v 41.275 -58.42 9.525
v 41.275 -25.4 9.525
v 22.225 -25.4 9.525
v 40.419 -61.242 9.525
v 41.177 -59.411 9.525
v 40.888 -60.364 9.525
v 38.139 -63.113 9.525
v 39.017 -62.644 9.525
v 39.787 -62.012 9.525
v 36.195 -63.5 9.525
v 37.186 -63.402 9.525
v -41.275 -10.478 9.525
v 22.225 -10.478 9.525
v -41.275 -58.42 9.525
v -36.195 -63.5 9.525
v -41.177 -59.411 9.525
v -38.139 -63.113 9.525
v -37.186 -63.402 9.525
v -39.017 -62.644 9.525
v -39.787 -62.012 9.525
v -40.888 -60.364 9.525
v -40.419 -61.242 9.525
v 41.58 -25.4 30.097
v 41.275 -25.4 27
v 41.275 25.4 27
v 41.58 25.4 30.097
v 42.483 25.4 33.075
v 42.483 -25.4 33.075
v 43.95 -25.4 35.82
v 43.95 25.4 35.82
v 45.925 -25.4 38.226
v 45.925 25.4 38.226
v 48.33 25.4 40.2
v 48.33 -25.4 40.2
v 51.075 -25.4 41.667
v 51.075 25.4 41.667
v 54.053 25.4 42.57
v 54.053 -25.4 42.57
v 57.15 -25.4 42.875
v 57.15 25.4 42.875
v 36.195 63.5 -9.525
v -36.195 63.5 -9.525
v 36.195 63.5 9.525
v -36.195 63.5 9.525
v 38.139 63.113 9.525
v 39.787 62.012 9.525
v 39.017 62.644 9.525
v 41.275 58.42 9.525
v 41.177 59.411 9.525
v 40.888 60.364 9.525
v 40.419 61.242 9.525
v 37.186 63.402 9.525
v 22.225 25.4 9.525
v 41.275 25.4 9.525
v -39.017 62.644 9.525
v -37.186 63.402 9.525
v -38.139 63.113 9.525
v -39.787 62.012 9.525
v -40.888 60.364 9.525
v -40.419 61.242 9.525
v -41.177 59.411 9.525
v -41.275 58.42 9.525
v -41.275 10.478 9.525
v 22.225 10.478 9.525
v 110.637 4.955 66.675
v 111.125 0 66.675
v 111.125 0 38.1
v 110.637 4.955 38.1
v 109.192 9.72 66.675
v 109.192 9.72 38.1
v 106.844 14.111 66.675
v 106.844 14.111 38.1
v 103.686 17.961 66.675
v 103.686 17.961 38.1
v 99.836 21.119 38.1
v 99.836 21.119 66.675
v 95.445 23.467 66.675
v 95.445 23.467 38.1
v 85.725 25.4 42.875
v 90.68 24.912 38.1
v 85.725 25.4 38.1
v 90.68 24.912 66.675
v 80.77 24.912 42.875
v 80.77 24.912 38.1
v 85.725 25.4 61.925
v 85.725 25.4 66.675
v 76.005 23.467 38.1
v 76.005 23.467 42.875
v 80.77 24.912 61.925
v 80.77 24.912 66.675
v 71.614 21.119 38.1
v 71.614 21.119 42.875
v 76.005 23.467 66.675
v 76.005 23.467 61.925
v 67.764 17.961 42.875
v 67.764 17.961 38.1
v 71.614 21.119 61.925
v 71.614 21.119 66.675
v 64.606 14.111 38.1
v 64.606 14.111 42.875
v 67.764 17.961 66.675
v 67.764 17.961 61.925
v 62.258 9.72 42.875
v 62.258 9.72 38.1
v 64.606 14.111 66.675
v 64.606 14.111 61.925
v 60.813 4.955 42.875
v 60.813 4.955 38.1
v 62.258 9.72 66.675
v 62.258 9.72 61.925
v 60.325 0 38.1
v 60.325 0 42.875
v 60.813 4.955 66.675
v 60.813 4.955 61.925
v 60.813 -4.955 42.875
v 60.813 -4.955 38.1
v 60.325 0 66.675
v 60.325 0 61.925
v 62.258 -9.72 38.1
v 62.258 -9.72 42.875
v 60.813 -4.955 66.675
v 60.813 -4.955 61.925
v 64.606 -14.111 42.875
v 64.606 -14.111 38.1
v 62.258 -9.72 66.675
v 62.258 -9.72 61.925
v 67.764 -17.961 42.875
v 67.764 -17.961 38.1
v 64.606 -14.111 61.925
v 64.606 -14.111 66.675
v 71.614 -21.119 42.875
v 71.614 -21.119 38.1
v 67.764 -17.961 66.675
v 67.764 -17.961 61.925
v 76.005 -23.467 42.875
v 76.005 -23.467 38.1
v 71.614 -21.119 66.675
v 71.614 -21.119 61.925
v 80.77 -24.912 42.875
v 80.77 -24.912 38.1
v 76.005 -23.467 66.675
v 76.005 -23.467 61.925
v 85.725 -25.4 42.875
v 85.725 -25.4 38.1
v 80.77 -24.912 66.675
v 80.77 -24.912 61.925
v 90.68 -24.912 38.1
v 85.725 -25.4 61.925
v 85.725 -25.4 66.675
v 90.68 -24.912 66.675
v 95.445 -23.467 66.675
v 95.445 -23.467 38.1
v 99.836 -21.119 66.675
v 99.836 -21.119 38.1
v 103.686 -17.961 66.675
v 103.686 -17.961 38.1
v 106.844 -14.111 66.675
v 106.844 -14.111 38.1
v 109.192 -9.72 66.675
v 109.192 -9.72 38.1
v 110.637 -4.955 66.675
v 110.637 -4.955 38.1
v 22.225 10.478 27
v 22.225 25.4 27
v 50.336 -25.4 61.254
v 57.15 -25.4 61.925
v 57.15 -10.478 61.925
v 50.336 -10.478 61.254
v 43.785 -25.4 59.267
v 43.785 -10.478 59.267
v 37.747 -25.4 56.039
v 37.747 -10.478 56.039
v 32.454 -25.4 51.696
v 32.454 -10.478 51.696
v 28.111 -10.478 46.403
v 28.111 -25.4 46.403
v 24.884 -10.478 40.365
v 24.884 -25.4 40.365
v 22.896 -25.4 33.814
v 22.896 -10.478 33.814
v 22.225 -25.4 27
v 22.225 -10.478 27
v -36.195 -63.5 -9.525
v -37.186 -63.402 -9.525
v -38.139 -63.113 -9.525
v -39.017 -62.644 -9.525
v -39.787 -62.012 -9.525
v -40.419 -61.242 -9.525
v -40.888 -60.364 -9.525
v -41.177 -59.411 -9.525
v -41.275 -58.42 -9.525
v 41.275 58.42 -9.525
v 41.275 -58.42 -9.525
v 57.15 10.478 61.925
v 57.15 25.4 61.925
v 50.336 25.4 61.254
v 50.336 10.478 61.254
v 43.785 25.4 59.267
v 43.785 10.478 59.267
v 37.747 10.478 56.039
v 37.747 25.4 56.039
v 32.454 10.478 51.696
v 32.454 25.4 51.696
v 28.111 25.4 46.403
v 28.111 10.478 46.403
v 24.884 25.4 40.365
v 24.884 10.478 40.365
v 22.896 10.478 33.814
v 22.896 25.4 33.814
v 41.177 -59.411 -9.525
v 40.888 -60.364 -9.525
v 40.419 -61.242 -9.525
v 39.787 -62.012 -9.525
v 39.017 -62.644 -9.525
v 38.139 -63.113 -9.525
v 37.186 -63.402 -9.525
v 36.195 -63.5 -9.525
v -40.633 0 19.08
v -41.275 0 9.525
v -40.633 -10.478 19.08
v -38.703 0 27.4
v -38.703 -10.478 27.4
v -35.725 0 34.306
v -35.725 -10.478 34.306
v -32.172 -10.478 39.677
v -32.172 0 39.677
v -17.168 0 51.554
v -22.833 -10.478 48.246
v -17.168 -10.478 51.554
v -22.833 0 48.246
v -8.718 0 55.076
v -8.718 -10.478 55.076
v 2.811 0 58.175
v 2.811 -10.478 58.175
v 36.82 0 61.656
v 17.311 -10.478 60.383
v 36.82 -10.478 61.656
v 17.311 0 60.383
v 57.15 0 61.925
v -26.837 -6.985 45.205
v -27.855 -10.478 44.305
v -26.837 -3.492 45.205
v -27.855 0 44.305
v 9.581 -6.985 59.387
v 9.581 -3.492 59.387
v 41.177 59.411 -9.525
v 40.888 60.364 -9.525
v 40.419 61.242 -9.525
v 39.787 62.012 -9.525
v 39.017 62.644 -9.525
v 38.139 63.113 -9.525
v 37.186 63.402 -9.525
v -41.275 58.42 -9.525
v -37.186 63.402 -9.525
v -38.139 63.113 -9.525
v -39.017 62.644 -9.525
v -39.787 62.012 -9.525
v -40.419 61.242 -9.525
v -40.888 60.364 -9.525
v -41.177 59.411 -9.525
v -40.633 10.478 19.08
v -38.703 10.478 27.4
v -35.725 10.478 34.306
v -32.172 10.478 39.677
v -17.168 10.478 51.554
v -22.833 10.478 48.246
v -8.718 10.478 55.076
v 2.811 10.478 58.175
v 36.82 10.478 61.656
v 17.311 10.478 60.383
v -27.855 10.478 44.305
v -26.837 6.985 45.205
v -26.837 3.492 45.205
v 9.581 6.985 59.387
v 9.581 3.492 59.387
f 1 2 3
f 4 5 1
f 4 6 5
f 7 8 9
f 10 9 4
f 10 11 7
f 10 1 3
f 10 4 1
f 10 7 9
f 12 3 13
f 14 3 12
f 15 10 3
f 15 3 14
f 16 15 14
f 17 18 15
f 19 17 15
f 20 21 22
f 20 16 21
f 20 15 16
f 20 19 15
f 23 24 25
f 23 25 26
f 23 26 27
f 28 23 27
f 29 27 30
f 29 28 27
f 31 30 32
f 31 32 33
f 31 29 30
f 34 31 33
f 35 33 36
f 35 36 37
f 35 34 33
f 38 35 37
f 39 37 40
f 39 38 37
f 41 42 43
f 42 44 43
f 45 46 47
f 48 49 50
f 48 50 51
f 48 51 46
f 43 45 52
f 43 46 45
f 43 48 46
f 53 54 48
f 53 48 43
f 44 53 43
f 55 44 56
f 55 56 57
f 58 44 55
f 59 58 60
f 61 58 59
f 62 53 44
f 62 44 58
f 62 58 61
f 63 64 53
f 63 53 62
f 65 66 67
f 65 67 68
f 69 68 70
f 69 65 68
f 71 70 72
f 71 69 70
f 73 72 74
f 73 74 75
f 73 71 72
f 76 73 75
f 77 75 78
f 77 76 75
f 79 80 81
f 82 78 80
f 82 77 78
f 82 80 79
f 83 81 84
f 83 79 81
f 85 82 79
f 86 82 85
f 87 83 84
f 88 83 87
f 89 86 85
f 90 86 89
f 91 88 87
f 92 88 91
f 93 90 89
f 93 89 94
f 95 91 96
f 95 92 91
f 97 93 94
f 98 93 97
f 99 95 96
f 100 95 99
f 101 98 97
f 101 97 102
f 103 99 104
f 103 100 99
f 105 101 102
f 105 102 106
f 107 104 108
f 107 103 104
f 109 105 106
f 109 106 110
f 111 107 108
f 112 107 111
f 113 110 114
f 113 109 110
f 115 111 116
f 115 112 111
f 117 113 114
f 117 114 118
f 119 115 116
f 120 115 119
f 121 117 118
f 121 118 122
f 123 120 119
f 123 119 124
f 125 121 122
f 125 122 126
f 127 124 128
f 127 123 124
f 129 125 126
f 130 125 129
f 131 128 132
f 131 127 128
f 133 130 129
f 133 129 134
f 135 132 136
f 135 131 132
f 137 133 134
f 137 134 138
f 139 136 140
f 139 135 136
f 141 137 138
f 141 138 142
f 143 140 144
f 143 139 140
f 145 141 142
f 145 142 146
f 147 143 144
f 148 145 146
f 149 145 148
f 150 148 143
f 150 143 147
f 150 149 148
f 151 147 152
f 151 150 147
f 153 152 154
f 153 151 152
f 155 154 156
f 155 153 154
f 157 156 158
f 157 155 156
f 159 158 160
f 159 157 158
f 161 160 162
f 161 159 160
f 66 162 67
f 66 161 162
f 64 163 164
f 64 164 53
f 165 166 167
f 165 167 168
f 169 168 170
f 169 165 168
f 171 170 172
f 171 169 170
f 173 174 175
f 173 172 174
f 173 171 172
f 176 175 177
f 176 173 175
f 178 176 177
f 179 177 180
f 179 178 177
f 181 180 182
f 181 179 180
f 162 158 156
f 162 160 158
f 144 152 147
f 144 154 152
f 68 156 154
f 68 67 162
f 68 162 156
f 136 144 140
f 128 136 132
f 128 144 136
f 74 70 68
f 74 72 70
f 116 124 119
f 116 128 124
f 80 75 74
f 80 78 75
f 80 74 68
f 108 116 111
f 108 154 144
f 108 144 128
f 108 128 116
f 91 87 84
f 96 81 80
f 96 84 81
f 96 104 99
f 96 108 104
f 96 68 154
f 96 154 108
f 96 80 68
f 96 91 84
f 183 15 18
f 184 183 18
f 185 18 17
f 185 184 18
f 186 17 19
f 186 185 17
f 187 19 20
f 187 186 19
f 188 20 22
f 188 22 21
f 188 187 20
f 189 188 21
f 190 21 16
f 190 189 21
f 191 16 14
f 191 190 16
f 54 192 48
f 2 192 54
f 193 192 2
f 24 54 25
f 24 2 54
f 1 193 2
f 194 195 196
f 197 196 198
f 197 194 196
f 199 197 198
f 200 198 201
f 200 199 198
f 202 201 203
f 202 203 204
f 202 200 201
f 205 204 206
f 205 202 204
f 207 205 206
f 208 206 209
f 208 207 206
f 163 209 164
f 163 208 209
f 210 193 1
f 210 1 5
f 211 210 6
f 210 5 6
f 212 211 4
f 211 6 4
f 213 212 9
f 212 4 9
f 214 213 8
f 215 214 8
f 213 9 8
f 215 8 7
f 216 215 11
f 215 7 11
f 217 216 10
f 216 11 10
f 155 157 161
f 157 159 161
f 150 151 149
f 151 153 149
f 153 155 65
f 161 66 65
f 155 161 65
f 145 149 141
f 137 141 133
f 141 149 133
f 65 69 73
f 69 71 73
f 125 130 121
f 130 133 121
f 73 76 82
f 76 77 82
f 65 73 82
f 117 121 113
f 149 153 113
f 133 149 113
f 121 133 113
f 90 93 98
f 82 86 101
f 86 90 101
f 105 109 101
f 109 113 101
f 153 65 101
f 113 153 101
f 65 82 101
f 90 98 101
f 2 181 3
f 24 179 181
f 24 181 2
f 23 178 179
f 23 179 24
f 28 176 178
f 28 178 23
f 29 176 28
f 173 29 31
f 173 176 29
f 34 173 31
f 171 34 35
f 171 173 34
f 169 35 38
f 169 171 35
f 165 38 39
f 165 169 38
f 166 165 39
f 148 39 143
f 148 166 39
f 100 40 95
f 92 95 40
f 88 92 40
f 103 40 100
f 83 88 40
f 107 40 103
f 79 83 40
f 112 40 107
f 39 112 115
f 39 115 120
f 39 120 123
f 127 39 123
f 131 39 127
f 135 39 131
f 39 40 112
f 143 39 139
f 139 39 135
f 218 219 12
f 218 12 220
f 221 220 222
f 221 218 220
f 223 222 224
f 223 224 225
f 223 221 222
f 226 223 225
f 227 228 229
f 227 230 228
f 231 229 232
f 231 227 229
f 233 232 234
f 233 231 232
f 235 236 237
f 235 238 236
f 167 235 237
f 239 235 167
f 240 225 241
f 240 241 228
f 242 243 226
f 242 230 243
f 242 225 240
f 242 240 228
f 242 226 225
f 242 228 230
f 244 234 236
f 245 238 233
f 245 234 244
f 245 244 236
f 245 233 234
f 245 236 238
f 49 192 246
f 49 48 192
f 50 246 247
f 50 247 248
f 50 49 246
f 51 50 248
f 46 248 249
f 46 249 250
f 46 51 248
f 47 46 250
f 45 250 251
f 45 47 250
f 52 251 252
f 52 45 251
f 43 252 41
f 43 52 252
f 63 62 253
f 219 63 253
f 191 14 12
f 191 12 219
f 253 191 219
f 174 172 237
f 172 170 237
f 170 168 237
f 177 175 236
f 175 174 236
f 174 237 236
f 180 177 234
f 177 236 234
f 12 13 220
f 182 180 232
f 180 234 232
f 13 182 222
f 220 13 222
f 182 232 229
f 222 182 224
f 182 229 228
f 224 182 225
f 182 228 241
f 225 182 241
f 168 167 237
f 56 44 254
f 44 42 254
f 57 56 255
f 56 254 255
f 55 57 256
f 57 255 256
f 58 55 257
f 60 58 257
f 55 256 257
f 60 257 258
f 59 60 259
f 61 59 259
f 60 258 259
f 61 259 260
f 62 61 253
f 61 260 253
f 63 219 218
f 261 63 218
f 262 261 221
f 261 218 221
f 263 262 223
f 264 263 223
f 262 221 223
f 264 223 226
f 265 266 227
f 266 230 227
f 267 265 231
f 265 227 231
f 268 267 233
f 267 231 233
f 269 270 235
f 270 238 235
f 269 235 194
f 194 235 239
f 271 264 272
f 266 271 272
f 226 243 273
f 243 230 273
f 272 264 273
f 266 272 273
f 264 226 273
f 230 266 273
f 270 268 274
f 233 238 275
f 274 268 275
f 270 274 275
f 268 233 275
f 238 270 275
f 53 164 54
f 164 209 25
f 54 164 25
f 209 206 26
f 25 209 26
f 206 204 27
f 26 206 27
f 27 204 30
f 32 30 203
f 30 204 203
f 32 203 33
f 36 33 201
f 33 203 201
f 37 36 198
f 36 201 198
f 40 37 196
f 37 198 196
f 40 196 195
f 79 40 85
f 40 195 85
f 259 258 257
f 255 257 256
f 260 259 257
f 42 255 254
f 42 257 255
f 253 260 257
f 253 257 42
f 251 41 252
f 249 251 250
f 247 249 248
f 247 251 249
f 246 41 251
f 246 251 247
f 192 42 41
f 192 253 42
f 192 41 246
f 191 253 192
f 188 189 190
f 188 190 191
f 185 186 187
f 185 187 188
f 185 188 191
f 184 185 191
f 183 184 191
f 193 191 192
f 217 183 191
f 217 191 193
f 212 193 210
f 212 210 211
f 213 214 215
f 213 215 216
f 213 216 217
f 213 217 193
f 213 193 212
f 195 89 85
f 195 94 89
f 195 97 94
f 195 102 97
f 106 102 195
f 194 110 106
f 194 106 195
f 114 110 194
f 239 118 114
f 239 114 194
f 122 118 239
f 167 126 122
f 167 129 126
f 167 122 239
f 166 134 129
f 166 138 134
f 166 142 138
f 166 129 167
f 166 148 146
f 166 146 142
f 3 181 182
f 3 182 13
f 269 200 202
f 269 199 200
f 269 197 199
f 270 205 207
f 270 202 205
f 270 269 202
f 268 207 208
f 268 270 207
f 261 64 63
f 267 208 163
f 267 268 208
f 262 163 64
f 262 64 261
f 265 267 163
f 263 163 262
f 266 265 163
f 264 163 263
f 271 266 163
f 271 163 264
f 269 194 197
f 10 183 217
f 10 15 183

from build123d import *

# Parameters (mm, degrees)
F1_DEPTH = 63.5
F2_DEPTH = 25.4
F3_DEPTH = 10.4775
F0_W     = 25.4
F0_H     = 4.7752
F0_H_2   = 19.05
F0_H_3   = 4.7498
F5_R     = 5.08


with BuildPart() as f1:
    # F0 (on Front) → F1 (new body, symmetric)
    with BuildSketch(Plane.XZ):
        Polygon((22.225, 9.525), (-41.275, 9.525), (-41.275, -9.525), (41.275, -9.525), (41.275, 9.525), align=None)
    extrude(amount=F1_DEPTH, both=True)

    # F0 (on Front) → F2 (join, symmetric)
    with BuildSketch(Plane.XZ):
        Polygon((22.225, 9.525), (-41.275, 9.525), (-41.275, -9.525), (41.275, -9.525), (41.275, 9.525), align=None)
        with BuildLine():
            Line((22.225, 27.0002), (22.225, 9.525))
            Line((22.225, 9.525), (41.275, 9.525))
            Line((41.275, 9.525), (41.275, 27.0002))
            ThreePointArc((41.275, 27.0002), (45.9246798487, 38.2255201513), (57.15, 42.8752))
            Line((57.15, 42.8752), (85.725, 42.8752))
            Line((85.725, 42.8752), (85.725, 61.9252))
            Line((85.725, 61.9252), (57.15, 61.9252))
            ThreePointArc((57.15, 61.9252), (32.4542956671, 51.6959043329), (22.225, 27.0002))
        make_face()
    extrude(amount=F2_DEPTH, both=True)

    # F0 (on Front) → F3 (join, symmetric)
    with BuildSketch(Plane.XZ):
        with BuildLine():
            add(Edge.make_bspline(
                [(-41.275, 9.525), (-41.4362549782, 59.2387728393), (7.6155788265, 61.9246140122), (57.15, 61.9252)],
                knots=[0, 0, 0, 0, 111.5045361635, 111.5045361635, 111.5045361635, 111.5045361635], degree=3))
            Line((-41.275, 9.525), (22.225, 9.525))
            Line((22.225, 9.525), (22.225, 27.0002))
            ThreePointArc((22.225, 27.0002), (32.4542956671, 51.6959043329), (57.15, 61.9252))
        make_face()
    extrude(amount=F3_DEPTH, both=True)

    # F0 (on Front) → F4 (revolve)
    with BuildSketch(Plane.XZ):
        with Locations((98.425, 40.4876)):
            Rectangle(F0_W, F0_H)
        with Locations((98.425, 52.4002)):
            Rectangle(F0_W, F0_H_2)
        with Locations((98.425, 64.3001)):
            Rectangle(F0_W, F0_H_3)
    revolve(axis=Axis((85.725, 0, 52.3875), (0, 0, 1)))

    # F5
    f5_edges = [f1.edges().sort_by_distance(p)[0] for p in [
        (41.275, 63.5, 0),
        (-41.275, 63.5, 0),
        (-41.275, -63.5, 0),
        (41.275, -63.5, 0),
    ]]
    fillet(f5_edges, radius=F5_R)


solid = f1.part
